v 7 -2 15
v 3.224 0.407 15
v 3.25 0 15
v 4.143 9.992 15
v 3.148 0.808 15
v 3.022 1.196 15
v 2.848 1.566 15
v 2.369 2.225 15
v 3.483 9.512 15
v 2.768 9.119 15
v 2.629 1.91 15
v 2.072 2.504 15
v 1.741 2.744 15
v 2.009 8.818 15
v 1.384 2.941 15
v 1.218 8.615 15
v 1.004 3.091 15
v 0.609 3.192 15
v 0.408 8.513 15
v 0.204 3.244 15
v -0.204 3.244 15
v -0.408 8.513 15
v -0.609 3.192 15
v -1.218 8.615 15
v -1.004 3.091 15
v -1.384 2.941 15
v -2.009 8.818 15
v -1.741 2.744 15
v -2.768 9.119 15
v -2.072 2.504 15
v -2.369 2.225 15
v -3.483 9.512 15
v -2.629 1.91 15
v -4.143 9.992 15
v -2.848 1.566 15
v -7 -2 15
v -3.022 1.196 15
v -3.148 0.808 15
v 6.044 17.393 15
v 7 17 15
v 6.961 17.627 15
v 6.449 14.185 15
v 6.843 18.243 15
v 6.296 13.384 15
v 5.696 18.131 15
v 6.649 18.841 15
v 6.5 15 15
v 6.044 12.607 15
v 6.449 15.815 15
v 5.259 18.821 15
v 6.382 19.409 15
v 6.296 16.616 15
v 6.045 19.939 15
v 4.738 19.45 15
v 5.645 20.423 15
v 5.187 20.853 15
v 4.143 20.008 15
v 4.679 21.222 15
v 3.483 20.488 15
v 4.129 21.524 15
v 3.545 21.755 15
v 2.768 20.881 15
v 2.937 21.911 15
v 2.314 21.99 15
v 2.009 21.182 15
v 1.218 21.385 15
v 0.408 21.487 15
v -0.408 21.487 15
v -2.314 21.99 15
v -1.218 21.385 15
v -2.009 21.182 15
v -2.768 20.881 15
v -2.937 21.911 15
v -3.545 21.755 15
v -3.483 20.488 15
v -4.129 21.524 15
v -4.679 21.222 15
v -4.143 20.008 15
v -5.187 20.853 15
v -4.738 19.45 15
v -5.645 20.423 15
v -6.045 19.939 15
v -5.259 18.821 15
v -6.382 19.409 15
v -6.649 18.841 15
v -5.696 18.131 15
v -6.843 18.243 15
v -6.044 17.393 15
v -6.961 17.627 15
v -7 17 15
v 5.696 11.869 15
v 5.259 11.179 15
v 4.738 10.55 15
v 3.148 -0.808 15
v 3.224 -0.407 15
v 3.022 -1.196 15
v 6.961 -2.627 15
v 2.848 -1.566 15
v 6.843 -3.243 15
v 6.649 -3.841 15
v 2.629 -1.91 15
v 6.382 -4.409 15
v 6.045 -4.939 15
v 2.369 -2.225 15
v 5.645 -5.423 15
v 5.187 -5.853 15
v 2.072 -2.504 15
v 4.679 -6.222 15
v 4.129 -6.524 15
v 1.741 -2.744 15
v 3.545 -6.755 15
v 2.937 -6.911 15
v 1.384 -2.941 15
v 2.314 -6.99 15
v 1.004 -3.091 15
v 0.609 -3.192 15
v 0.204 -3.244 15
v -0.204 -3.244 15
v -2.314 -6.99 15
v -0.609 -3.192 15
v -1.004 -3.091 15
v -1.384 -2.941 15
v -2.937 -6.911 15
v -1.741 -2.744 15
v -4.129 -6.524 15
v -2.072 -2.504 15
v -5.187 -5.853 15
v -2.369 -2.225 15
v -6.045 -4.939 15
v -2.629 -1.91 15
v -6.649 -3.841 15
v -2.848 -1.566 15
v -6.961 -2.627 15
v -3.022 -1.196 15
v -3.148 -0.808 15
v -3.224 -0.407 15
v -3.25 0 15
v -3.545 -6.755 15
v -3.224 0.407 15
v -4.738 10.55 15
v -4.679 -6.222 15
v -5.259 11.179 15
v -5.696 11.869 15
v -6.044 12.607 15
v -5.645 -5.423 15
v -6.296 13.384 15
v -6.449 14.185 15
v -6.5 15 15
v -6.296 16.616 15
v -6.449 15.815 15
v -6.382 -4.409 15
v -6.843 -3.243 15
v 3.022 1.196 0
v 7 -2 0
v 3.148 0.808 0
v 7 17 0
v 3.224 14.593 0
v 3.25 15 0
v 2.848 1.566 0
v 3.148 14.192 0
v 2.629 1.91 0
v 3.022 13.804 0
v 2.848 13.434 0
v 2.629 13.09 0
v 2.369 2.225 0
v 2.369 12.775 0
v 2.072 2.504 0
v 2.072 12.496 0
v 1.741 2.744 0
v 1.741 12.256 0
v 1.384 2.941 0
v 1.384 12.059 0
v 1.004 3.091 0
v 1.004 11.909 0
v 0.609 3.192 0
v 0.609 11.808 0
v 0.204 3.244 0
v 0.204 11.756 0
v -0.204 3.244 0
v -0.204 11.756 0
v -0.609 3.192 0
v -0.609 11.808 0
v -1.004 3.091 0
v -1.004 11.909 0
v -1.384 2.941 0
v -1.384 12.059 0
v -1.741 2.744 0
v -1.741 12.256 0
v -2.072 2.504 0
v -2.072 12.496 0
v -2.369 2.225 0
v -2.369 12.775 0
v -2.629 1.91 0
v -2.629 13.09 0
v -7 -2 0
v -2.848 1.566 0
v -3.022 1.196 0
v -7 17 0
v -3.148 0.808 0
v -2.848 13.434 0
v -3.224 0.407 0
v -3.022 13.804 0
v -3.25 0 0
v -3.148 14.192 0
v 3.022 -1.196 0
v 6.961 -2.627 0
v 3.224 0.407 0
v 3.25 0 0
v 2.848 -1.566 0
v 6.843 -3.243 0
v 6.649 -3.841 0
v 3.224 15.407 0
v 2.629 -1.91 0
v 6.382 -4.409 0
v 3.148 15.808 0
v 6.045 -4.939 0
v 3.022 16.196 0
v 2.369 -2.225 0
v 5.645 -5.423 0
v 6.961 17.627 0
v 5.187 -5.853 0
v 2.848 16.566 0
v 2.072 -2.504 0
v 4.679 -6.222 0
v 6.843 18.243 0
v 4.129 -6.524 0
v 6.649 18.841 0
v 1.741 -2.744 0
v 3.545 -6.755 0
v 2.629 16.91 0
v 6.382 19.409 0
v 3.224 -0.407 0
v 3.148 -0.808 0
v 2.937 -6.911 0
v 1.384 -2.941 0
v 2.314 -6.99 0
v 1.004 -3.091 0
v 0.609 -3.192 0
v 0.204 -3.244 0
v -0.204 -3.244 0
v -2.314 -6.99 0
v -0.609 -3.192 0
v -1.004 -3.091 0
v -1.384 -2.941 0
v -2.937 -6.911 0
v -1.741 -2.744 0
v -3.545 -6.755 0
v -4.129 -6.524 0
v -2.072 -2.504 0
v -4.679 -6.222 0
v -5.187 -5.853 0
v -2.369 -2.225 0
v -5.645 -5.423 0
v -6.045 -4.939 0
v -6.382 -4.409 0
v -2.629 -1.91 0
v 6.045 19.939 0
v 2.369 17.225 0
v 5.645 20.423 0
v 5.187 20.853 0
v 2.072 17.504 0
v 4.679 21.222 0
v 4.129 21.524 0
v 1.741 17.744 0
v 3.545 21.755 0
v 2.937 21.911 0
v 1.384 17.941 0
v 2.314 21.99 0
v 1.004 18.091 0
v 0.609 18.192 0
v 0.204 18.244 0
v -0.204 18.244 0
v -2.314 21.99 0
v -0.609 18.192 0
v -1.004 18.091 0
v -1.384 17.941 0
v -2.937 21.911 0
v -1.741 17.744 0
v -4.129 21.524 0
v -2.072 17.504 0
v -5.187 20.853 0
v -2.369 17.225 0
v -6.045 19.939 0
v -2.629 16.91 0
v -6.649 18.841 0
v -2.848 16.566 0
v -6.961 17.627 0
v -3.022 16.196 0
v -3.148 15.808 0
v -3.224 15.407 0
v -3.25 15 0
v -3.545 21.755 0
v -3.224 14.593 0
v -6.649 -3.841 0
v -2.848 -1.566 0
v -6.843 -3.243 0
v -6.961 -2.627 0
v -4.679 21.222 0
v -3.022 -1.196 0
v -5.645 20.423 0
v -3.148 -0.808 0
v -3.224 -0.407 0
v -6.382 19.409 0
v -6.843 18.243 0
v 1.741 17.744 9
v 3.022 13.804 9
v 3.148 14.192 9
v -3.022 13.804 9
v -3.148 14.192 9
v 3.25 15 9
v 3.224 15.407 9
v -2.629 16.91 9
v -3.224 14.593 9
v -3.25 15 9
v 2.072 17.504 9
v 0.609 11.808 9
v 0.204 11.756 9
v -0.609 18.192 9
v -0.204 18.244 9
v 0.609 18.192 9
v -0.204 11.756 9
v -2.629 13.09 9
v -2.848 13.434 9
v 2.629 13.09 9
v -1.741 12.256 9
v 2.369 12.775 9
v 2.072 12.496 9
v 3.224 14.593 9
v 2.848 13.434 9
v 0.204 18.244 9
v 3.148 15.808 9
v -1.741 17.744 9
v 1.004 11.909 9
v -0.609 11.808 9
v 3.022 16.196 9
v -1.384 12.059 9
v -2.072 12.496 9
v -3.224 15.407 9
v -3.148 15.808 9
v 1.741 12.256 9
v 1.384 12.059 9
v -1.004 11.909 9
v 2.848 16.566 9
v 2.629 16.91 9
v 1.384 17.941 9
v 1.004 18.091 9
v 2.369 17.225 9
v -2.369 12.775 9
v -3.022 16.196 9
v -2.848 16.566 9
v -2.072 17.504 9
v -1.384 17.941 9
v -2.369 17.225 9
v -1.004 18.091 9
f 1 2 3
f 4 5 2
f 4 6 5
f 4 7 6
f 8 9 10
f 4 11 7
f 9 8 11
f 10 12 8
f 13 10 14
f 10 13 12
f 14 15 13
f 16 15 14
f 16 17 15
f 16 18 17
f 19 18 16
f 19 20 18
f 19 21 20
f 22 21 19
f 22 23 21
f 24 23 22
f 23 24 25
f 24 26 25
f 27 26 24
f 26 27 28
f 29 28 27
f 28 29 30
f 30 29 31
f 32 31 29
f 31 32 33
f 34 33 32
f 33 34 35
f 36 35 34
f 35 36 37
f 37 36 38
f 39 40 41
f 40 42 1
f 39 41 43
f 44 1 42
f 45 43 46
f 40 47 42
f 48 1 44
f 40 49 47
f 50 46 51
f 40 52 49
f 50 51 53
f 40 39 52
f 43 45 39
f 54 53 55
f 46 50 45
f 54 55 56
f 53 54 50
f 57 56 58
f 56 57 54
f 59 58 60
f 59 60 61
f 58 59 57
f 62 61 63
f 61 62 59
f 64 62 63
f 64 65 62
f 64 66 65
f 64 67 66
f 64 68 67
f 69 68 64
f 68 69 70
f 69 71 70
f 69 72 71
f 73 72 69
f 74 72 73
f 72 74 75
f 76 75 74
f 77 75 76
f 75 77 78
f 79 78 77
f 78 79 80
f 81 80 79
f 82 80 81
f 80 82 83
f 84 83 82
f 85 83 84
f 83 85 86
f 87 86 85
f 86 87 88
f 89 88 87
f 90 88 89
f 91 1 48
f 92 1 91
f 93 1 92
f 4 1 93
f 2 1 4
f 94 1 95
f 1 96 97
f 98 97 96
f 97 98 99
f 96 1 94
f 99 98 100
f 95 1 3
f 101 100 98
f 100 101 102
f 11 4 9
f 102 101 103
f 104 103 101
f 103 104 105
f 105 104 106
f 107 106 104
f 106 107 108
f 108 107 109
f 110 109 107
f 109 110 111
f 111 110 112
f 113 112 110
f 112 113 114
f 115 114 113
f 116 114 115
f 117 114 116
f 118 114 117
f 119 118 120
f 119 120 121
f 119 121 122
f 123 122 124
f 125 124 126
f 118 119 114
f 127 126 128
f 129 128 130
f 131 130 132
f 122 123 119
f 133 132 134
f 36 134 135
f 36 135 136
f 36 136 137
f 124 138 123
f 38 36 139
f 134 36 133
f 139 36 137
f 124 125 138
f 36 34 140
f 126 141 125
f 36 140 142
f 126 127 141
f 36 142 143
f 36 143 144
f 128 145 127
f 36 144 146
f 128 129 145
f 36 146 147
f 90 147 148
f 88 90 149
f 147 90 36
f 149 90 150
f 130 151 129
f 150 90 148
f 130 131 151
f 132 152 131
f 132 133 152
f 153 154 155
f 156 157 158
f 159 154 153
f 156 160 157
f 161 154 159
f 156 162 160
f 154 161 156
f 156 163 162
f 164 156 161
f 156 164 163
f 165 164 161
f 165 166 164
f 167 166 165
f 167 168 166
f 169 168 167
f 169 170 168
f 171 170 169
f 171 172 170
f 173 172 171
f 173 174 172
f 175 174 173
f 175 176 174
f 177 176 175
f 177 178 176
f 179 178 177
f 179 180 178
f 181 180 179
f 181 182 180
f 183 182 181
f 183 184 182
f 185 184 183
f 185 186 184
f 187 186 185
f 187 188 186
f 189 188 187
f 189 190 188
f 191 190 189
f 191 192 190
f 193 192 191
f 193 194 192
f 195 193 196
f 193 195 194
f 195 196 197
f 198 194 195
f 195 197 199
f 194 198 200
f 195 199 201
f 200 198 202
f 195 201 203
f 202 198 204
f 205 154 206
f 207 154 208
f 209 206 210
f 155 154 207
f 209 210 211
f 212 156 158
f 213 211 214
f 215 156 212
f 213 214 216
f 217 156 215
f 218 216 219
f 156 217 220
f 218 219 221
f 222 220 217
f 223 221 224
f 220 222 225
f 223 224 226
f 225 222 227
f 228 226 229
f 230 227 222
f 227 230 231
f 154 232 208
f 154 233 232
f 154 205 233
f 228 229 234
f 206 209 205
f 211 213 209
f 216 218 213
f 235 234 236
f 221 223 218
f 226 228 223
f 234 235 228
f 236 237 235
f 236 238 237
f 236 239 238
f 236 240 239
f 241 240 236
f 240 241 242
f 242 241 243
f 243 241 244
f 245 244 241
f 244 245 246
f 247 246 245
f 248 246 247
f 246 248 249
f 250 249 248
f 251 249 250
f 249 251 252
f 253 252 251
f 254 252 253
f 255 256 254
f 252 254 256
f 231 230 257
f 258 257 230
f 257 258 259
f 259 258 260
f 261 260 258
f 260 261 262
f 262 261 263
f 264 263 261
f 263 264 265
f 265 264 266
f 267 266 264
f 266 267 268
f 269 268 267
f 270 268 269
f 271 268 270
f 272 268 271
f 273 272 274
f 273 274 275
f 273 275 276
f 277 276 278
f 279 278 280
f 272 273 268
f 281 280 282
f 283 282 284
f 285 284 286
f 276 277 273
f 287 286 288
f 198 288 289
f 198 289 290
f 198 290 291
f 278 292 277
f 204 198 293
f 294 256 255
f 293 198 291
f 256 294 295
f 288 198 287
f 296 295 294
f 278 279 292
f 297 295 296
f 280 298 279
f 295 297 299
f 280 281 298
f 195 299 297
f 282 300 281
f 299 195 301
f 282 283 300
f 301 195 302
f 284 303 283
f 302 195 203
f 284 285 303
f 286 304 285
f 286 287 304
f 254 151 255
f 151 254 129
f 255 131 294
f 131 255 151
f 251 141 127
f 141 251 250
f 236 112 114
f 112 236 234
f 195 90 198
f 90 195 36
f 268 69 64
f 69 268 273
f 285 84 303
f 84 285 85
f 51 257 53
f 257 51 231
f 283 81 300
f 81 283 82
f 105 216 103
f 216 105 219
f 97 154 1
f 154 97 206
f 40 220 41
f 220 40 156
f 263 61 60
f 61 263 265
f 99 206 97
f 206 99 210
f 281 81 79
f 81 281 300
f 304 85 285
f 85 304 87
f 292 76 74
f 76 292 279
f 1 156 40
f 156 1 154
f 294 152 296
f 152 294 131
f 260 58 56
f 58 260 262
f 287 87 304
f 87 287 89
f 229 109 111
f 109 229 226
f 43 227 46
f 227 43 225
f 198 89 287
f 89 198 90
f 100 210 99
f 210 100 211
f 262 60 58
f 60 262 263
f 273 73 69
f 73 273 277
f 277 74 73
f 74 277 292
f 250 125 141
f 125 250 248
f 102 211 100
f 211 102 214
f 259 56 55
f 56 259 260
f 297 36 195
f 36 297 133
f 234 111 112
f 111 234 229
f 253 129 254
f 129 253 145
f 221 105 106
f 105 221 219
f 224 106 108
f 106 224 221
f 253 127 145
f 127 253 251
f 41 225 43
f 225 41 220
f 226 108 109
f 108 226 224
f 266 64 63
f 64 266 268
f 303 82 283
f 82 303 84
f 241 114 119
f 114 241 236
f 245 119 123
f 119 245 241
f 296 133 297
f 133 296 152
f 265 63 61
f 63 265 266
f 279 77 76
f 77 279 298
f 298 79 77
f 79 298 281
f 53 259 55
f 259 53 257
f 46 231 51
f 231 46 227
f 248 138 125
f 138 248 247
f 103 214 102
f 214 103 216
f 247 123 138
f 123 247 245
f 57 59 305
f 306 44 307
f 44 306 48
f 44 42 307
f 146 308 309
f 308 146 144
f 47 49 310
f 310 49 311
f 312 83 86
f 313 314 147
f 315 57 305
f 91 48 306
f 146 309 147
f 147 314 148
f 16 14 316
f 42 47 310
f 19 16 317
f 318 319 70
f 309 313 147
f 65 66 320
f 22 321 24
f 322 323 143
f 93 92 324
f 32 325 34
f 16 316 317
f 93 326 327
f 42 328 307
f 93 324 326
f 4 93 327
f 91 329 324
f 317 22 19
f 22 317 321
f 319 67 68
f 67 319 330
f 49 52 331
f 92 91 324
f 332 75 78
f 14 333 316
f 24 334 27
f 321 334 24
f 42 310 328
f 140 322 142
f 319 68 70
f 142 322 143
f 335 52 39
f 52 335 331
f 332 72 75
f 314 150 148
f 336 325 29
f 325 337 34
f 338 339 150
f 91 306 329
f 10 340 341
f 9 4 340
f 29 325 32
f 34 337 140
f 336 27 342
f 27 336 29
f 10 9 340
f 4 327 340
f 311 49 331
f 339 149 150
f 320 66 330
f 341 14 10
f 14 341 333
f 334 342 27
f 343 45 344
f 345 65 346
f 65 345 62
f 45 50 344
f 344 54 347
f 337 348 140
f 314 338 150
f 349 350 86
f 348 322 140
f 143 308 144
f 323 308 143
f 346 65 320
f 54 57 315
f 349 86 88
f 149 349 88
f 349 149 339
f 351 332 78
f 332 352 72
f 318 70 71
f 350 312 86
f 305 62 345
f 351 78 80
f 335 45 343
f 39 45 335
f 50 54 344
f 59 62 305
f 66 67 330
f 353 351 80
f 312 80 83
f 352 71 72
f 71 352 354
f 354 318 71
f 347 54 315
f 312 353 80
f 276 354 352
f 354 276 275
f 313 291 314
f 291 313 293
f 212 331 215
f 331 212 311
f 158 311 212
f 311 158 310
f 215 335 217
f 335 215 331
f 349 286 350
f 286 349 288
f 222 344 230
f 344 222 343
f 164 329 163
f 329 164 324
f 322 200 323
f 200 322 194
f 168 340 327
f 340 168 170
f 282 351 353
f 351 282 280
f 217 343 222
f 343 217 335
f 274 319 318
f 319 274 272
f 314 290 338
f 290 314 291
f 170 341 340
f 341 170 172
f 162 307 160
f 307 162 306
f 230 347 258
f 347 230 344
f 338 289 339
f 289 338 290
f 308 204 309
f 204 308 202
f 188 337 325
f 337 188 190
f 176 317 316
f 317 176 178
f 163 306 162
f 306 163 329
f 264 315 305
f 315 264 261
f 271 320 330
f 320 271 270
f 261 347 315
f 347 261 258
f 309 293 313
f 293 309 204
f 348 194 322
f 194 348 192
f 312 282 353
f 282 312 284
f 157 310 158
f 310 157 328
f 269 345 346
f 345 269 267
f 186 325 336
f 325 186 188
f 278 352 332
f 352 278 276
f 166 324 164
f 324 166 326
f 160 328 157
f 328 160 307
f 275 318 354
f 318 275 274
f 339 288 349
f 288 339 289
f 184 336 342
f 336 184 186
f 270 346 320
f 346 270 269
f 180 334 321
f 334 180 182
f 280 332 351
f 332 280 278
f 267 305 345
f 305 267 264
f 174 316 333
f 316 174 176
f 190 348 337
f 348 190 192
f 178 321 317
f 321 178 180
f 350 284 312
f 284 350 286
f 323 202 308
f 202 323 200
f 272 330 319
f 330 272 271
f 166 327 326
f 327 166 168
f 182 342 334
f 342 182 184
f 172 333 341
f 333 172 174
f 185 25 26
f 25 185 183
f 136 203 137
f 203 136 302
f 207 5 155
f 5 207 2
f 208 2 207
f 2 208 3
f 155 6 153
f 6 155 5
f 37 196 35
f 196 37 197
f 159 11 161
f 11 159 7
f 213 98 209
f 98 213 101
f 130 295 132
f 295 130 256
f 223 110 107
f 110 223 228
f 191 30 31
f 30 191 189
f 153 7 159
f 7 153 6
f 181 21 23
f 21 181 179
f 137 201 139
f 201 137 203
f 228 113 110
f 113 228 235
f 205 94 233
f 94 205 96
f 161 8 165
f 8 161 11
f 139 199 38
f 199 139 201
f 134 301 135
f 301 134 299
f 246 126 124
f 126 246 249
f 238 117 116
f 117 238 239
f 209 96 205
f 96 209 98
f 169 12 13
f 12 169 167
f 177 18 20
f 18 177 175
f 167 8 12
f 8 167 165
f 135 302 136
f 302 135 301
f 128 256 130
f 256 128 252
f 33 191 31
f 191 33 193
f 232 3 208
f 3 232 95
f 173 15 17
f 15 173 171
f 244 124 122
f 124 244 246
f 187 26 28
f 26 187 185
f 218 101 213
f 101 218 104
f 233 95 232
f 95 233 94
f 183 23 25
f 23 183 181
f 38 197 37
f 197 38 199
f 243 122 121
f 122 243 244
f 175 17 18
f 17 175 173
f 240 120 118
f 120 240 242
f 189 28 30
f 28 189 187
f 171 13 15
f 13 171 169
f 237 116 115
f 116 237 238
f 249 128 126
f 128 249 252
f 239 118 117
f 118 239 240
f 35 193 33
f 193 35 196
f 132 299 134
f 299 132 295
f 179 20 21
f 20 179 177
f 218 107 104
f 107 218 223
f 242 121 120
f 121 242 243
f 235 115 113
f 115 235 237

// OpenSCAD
$fn = 50;


difference() {
	union() {
		cylinder(h = 15, r = 7.0000000000);
		translate(v = [0.0000000000, 7.5000000000, 0]) {
			hull() {
				translate(v = [-2.0000000000, 9.5000000000, 0]) {
					cylinder(h = 15, r = 5);
				}
				translate(v = [2.0000000000, 9.5000000000, 0]) {
					cylinder(h = 15, r = 5);
				}
				translate(v = [-2.0000000000, -9.5000000000, 0]) {
					cylinder(h = 15, r = 5);
				}
				translate(v = [2.0000000000, -9.5000000000, 0]) {
					cylinder(h = 15, r = 5);
				}
			}
		}
		translate(v = [0.0000000000, 7.5000000000, 0]) {
			hull() {
				translate(v = [-2.0000000000, 9.5000000000, 0]) {
					cylinder(h = 15, r = 5);
				}
				translate(v = [2.0000000000, 9.5000000000, 0]) {
					cylinder(h = 15, r = 5);
				}
				translate(v = [-2.0000000000, -9.5000000000, 0]) {
					cylinder(h = 15, r = 5);
				}
				translate(v = [2.0000000000, -9.5000000000, 0]) {
					cylinder(h = 15, r = 5);
				}
			}
		}
	}
	union() {
		translate(v = [0.0000000000, 15.0000000000, 15]) {
			rotate(a = [0, 0, 0]) {
				difference() {
					union() {
						#translate(v = [0, 0, -15.0000000000]) {
							cylinder(h = 15, r = 2.2500000000);
						}
						#translate(v = [0, 0, -6]) {
							cylinder(h = 6, r1 = 3.2500000000, r2 = 6.5000000000);
						}
						#translate(v = [0, 0, -15.0000000000]) {
							cylinder(h = 15, r = 3.2500000000);
						}
						#translate(v = [0, 0, -15.0000000000]) {
							cylinder(h = 15, r = 2.2500000000);
						}
					}
					union();
				}
			}
		}
		translate(v = [0.0000000000, 15.0000000000, 15]) {
			rotate(a = [0, 0, 0]) {
				difference() {
					union() {
						#translate(v = [0, 0, -15.0000000000]) {
							cylinder(h = 15, r = 2.2500000000);
						}
						#translate(v = [0, 0, -6]) {
							cylinder(h = 6, r1 = 3.2500000000, r2 = 6.5000000000);
						}
						#translate(v = [0, 0, -15.0000000000]) {
							cylinder(h = 15, r = 3.2500000000);
						}
						#translate(v = [0, 0, -15.0000000000]) {
							cylinder(h = 15, r = 2.2500000000);
						}
					}
					union();
				}
			}
		}
		translate(v = [0, 0, -100]) {
			cylinder(h = 200, r = 3.2500000000);
		}
		translate(v = [0, 0, -100]) {
			cylinder(h = 200, r = 1.8000000000);
		}
	}
}
